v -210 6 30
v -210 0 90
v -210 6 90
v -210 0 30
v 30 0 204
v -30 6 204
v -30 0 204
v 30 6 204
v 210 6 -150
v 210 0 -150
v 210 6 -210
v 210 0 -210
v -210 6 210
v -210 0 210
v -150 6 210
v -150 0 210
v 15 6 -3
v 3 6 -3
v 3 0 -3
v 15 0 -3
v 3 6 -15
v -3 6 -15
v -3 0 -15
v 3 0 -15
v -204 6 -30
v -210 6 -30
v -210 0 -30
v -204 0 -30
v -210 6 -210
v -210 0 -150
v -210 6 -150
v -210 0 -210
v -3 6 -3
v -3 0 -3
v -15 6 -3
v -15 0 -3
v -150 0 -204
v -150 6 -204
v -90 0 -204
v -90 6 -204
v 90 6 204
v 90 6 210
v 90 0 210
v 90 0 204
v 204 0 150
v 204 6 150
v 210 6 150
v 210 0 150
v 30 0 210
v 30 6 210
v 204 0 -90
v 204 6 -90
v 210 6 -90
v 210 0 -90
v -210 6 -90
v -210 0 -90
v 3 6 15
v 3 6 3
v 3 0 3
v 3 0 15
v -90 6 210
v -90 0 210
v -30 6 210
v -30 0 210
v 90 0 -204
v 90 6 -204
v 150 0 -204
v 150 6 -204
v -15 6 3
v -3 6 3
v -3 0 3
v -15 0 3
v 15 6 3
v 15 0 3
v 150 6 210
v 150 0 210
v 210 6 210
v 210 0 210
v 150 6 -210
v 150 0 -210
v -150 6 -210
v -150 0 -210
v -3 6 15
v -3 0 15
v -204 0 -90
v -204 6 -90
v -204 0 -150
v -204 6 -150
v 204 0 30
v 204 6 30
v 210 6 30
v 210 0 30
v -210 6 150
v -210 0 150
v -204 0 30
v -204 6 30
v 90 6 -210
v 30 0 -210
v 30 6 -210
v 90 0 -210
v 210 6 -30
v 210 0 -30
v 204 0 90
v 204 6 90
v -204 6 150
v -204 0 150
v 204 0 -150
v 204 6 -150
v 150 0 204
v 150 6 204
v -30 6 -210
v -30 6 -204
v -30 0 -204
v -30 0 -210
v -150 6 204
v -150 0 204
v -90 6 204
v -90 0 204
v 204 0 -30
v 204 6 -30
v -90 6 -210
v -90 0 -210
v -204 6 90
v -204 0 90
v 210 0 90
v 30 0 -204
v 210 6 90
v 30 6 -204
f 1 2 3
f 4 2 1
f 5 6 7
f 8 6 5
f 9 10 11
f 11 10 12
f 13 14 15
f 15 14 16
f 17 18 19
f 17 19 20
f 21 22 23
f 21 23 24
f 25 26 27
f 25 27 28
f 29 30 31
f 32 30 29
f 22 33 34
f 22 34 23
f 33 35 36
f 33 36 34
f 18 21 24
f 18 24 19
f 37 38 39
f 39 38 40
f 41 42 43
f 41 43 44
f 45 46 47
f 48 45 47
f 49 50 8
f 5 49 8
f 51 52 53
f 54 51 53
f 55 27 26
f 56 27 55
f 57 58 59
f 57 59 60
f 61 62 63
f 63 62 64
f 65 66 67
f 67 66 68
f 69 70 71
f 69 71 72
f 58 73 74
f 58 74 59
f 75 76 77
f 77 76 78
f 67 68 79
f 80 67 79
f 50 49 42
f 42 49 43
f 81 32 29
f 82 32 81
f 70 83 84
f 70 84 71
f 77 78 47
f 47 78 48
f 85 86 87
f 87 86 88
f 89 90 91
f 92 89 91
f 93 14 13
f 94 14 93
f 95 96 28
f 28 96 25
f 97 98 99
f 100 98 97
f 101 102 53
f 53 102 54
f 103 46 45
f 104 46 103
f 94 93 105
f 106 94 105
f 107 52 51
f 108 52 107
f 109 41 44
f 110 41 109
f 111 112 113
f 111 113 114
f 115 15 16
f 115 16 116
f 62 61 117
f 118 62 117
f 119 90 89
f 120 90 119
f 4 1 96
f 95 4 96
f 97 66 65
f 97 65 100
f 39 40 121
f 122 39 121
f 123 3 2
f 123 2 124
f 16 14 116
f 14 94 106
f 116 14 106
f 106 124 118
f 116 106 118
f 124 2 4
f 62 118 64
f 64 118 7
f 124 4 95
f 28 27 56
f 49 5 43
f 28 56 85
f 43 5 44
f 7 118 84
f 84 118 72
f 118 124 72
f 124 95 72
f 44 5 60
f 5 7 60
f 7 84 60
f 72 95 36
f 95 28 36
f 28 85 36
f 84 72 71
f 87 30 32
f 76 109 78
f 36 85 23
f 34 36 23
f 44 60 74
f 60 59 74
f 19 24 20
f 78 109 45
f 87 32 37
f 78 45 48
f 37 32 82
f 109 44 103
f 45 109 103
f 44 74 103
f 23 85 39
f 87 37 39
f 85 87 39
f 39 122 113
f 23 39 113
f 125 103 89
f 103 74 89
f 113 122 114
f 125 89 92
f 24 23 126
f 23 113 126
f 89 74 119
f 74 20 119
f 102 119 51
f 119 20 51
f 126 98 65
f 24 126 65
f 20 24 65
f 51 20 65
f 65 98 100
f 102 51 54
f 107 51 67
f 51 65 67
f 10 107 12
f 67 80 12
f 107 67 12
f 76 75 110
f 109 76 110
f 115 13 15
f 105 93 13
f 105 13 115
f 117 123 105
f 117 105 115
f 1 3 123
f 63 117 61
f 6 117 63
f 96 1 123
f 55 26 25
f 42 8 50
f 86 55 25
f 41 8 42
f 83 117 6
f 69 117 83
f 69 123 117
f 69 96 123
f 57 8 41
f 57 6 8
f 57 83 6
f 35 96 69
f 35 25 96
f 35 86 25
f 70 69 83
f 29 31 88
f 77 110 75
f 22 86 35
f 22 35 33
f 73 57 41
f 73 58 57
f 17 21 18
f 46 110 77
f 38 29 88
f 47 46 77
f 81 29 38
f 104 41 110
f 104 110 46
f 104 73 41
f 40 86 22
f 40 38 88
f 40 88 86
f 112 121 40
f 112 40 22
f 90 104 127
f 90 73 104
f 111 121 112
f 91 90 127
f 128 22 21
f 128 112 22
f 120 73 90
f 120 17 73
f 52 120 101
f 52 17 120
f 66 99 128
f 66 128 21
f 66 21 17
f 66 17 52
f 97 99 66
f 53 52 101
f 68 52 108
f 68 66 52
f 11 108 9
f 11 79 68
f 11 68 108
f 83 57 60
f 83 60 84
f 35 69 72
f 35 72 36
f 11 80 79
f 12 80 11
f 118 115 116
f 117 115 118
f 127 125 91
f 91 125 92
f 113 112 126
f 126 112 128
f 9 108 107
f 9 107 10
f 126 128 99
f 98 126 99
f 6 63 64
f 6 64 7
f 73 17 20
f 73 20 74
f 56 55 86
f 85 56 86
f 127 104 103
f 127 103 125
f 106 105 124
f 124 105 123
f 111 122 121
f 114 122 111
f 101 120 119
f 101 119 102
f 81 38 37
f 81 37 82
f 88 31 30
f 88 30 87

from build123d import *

# Parameters (mm, degrees)
SKETCH1_W           = 420
SKETCH1_H           = 420
BOSS_EXTRUDE1_DEPTH = 6
SKETCH3_W           = 6
SKETCH3_H           = 60
SKETCH3_W_2         = 60
SKETCH3_H_2         = 6
CUT_EXTRUDE2_DEPTH  = 7
CUT_EXTRUDE3_DEPTH  = 7


with BuildPart() as part:
    # Sketch1 → Boss-Extrude1 (new body)
    with BuildSketch(Plane(origin=(0, 0, 0), x_dir=(1, 0, 0), z_dir=(0, 1, 0))):
        Rectangle(SKETCH1_W, SKETCH1_H)
    extrude(amount=BOSS_EXTRUDE1_DEPTH)

    # Sketch3 → Cut-Extrude2 (cut, through all)
    with BuildSketch(Plane(origin=(0, 6, 0), x_dir=(1, 0, 0), z_dir=(0, 1, 0))):
        with Locations((-207, 120)):
            Rectangle(SKETCH3_W, SKETCH3_H)
        with Locations((-207, 0)):
            Rectangle(SKETCH3_W, SKETCH3_H)
        with Locations((-207, -120)):
            Rectangle(SKETCH3_W, SKETCH3_H)
        with Locations((120, 207)):
            Rectangle(SKETCH3_W_2, SKETCH3_H_2)
        with Locations((0, 207)):
            Rectangle(SKETCH3_W_2, SKETCH3_H_2)
        with Locations((-120, 207)):
            Rectangle(SKETCH3_W_2, SKETCH3_H_2)
        with Locations((207, -120)):
            Rectangle(SKETCH3_W, SKETCH3_H)
        with Locations((207, 0)):
            Rectangle(SKETCH3_W, SKETCH3_H)
        with Locations((207, 120)):
            Rectangle(SKETCH3_W, SKETCH3_H)
        with Locations((-120, -207)):
            Rectangle(SKETCH3_W_2, SKETCH3_H_2)
        with Locations((0, -207)):
            Rectangle(SKETCH3_W_2, SKETCH3_H_2)
        with Locations((120, -207)):
            Rectangle(SKETCH3_W_2, SKETCH3_H_2)
    extrude(amount=-CUT_EXTRUDE2_DEPTH, mode=Mode.SUBTRACT)

    # Sketch5 → Cut-Extrude3 (cut, through all)
    with BuildSketch(Plane(origin=(0, 6, 0), x_dir=(1, 0, 0), z_dir=(0, 1, 0))):
        Polygon((3, 3), (15, 3), (15, -3), (3, -3), (3, -15), (-3, -15), (-3, -3), (-15, -3), (-15, 3), (-3, 3), (-3, 15), (3, 15), align=None)
    extrude(amount=-CUT_EXTRUDE3_DEPTH, mode=Mode.SUBTRACT)


solid = part.part
